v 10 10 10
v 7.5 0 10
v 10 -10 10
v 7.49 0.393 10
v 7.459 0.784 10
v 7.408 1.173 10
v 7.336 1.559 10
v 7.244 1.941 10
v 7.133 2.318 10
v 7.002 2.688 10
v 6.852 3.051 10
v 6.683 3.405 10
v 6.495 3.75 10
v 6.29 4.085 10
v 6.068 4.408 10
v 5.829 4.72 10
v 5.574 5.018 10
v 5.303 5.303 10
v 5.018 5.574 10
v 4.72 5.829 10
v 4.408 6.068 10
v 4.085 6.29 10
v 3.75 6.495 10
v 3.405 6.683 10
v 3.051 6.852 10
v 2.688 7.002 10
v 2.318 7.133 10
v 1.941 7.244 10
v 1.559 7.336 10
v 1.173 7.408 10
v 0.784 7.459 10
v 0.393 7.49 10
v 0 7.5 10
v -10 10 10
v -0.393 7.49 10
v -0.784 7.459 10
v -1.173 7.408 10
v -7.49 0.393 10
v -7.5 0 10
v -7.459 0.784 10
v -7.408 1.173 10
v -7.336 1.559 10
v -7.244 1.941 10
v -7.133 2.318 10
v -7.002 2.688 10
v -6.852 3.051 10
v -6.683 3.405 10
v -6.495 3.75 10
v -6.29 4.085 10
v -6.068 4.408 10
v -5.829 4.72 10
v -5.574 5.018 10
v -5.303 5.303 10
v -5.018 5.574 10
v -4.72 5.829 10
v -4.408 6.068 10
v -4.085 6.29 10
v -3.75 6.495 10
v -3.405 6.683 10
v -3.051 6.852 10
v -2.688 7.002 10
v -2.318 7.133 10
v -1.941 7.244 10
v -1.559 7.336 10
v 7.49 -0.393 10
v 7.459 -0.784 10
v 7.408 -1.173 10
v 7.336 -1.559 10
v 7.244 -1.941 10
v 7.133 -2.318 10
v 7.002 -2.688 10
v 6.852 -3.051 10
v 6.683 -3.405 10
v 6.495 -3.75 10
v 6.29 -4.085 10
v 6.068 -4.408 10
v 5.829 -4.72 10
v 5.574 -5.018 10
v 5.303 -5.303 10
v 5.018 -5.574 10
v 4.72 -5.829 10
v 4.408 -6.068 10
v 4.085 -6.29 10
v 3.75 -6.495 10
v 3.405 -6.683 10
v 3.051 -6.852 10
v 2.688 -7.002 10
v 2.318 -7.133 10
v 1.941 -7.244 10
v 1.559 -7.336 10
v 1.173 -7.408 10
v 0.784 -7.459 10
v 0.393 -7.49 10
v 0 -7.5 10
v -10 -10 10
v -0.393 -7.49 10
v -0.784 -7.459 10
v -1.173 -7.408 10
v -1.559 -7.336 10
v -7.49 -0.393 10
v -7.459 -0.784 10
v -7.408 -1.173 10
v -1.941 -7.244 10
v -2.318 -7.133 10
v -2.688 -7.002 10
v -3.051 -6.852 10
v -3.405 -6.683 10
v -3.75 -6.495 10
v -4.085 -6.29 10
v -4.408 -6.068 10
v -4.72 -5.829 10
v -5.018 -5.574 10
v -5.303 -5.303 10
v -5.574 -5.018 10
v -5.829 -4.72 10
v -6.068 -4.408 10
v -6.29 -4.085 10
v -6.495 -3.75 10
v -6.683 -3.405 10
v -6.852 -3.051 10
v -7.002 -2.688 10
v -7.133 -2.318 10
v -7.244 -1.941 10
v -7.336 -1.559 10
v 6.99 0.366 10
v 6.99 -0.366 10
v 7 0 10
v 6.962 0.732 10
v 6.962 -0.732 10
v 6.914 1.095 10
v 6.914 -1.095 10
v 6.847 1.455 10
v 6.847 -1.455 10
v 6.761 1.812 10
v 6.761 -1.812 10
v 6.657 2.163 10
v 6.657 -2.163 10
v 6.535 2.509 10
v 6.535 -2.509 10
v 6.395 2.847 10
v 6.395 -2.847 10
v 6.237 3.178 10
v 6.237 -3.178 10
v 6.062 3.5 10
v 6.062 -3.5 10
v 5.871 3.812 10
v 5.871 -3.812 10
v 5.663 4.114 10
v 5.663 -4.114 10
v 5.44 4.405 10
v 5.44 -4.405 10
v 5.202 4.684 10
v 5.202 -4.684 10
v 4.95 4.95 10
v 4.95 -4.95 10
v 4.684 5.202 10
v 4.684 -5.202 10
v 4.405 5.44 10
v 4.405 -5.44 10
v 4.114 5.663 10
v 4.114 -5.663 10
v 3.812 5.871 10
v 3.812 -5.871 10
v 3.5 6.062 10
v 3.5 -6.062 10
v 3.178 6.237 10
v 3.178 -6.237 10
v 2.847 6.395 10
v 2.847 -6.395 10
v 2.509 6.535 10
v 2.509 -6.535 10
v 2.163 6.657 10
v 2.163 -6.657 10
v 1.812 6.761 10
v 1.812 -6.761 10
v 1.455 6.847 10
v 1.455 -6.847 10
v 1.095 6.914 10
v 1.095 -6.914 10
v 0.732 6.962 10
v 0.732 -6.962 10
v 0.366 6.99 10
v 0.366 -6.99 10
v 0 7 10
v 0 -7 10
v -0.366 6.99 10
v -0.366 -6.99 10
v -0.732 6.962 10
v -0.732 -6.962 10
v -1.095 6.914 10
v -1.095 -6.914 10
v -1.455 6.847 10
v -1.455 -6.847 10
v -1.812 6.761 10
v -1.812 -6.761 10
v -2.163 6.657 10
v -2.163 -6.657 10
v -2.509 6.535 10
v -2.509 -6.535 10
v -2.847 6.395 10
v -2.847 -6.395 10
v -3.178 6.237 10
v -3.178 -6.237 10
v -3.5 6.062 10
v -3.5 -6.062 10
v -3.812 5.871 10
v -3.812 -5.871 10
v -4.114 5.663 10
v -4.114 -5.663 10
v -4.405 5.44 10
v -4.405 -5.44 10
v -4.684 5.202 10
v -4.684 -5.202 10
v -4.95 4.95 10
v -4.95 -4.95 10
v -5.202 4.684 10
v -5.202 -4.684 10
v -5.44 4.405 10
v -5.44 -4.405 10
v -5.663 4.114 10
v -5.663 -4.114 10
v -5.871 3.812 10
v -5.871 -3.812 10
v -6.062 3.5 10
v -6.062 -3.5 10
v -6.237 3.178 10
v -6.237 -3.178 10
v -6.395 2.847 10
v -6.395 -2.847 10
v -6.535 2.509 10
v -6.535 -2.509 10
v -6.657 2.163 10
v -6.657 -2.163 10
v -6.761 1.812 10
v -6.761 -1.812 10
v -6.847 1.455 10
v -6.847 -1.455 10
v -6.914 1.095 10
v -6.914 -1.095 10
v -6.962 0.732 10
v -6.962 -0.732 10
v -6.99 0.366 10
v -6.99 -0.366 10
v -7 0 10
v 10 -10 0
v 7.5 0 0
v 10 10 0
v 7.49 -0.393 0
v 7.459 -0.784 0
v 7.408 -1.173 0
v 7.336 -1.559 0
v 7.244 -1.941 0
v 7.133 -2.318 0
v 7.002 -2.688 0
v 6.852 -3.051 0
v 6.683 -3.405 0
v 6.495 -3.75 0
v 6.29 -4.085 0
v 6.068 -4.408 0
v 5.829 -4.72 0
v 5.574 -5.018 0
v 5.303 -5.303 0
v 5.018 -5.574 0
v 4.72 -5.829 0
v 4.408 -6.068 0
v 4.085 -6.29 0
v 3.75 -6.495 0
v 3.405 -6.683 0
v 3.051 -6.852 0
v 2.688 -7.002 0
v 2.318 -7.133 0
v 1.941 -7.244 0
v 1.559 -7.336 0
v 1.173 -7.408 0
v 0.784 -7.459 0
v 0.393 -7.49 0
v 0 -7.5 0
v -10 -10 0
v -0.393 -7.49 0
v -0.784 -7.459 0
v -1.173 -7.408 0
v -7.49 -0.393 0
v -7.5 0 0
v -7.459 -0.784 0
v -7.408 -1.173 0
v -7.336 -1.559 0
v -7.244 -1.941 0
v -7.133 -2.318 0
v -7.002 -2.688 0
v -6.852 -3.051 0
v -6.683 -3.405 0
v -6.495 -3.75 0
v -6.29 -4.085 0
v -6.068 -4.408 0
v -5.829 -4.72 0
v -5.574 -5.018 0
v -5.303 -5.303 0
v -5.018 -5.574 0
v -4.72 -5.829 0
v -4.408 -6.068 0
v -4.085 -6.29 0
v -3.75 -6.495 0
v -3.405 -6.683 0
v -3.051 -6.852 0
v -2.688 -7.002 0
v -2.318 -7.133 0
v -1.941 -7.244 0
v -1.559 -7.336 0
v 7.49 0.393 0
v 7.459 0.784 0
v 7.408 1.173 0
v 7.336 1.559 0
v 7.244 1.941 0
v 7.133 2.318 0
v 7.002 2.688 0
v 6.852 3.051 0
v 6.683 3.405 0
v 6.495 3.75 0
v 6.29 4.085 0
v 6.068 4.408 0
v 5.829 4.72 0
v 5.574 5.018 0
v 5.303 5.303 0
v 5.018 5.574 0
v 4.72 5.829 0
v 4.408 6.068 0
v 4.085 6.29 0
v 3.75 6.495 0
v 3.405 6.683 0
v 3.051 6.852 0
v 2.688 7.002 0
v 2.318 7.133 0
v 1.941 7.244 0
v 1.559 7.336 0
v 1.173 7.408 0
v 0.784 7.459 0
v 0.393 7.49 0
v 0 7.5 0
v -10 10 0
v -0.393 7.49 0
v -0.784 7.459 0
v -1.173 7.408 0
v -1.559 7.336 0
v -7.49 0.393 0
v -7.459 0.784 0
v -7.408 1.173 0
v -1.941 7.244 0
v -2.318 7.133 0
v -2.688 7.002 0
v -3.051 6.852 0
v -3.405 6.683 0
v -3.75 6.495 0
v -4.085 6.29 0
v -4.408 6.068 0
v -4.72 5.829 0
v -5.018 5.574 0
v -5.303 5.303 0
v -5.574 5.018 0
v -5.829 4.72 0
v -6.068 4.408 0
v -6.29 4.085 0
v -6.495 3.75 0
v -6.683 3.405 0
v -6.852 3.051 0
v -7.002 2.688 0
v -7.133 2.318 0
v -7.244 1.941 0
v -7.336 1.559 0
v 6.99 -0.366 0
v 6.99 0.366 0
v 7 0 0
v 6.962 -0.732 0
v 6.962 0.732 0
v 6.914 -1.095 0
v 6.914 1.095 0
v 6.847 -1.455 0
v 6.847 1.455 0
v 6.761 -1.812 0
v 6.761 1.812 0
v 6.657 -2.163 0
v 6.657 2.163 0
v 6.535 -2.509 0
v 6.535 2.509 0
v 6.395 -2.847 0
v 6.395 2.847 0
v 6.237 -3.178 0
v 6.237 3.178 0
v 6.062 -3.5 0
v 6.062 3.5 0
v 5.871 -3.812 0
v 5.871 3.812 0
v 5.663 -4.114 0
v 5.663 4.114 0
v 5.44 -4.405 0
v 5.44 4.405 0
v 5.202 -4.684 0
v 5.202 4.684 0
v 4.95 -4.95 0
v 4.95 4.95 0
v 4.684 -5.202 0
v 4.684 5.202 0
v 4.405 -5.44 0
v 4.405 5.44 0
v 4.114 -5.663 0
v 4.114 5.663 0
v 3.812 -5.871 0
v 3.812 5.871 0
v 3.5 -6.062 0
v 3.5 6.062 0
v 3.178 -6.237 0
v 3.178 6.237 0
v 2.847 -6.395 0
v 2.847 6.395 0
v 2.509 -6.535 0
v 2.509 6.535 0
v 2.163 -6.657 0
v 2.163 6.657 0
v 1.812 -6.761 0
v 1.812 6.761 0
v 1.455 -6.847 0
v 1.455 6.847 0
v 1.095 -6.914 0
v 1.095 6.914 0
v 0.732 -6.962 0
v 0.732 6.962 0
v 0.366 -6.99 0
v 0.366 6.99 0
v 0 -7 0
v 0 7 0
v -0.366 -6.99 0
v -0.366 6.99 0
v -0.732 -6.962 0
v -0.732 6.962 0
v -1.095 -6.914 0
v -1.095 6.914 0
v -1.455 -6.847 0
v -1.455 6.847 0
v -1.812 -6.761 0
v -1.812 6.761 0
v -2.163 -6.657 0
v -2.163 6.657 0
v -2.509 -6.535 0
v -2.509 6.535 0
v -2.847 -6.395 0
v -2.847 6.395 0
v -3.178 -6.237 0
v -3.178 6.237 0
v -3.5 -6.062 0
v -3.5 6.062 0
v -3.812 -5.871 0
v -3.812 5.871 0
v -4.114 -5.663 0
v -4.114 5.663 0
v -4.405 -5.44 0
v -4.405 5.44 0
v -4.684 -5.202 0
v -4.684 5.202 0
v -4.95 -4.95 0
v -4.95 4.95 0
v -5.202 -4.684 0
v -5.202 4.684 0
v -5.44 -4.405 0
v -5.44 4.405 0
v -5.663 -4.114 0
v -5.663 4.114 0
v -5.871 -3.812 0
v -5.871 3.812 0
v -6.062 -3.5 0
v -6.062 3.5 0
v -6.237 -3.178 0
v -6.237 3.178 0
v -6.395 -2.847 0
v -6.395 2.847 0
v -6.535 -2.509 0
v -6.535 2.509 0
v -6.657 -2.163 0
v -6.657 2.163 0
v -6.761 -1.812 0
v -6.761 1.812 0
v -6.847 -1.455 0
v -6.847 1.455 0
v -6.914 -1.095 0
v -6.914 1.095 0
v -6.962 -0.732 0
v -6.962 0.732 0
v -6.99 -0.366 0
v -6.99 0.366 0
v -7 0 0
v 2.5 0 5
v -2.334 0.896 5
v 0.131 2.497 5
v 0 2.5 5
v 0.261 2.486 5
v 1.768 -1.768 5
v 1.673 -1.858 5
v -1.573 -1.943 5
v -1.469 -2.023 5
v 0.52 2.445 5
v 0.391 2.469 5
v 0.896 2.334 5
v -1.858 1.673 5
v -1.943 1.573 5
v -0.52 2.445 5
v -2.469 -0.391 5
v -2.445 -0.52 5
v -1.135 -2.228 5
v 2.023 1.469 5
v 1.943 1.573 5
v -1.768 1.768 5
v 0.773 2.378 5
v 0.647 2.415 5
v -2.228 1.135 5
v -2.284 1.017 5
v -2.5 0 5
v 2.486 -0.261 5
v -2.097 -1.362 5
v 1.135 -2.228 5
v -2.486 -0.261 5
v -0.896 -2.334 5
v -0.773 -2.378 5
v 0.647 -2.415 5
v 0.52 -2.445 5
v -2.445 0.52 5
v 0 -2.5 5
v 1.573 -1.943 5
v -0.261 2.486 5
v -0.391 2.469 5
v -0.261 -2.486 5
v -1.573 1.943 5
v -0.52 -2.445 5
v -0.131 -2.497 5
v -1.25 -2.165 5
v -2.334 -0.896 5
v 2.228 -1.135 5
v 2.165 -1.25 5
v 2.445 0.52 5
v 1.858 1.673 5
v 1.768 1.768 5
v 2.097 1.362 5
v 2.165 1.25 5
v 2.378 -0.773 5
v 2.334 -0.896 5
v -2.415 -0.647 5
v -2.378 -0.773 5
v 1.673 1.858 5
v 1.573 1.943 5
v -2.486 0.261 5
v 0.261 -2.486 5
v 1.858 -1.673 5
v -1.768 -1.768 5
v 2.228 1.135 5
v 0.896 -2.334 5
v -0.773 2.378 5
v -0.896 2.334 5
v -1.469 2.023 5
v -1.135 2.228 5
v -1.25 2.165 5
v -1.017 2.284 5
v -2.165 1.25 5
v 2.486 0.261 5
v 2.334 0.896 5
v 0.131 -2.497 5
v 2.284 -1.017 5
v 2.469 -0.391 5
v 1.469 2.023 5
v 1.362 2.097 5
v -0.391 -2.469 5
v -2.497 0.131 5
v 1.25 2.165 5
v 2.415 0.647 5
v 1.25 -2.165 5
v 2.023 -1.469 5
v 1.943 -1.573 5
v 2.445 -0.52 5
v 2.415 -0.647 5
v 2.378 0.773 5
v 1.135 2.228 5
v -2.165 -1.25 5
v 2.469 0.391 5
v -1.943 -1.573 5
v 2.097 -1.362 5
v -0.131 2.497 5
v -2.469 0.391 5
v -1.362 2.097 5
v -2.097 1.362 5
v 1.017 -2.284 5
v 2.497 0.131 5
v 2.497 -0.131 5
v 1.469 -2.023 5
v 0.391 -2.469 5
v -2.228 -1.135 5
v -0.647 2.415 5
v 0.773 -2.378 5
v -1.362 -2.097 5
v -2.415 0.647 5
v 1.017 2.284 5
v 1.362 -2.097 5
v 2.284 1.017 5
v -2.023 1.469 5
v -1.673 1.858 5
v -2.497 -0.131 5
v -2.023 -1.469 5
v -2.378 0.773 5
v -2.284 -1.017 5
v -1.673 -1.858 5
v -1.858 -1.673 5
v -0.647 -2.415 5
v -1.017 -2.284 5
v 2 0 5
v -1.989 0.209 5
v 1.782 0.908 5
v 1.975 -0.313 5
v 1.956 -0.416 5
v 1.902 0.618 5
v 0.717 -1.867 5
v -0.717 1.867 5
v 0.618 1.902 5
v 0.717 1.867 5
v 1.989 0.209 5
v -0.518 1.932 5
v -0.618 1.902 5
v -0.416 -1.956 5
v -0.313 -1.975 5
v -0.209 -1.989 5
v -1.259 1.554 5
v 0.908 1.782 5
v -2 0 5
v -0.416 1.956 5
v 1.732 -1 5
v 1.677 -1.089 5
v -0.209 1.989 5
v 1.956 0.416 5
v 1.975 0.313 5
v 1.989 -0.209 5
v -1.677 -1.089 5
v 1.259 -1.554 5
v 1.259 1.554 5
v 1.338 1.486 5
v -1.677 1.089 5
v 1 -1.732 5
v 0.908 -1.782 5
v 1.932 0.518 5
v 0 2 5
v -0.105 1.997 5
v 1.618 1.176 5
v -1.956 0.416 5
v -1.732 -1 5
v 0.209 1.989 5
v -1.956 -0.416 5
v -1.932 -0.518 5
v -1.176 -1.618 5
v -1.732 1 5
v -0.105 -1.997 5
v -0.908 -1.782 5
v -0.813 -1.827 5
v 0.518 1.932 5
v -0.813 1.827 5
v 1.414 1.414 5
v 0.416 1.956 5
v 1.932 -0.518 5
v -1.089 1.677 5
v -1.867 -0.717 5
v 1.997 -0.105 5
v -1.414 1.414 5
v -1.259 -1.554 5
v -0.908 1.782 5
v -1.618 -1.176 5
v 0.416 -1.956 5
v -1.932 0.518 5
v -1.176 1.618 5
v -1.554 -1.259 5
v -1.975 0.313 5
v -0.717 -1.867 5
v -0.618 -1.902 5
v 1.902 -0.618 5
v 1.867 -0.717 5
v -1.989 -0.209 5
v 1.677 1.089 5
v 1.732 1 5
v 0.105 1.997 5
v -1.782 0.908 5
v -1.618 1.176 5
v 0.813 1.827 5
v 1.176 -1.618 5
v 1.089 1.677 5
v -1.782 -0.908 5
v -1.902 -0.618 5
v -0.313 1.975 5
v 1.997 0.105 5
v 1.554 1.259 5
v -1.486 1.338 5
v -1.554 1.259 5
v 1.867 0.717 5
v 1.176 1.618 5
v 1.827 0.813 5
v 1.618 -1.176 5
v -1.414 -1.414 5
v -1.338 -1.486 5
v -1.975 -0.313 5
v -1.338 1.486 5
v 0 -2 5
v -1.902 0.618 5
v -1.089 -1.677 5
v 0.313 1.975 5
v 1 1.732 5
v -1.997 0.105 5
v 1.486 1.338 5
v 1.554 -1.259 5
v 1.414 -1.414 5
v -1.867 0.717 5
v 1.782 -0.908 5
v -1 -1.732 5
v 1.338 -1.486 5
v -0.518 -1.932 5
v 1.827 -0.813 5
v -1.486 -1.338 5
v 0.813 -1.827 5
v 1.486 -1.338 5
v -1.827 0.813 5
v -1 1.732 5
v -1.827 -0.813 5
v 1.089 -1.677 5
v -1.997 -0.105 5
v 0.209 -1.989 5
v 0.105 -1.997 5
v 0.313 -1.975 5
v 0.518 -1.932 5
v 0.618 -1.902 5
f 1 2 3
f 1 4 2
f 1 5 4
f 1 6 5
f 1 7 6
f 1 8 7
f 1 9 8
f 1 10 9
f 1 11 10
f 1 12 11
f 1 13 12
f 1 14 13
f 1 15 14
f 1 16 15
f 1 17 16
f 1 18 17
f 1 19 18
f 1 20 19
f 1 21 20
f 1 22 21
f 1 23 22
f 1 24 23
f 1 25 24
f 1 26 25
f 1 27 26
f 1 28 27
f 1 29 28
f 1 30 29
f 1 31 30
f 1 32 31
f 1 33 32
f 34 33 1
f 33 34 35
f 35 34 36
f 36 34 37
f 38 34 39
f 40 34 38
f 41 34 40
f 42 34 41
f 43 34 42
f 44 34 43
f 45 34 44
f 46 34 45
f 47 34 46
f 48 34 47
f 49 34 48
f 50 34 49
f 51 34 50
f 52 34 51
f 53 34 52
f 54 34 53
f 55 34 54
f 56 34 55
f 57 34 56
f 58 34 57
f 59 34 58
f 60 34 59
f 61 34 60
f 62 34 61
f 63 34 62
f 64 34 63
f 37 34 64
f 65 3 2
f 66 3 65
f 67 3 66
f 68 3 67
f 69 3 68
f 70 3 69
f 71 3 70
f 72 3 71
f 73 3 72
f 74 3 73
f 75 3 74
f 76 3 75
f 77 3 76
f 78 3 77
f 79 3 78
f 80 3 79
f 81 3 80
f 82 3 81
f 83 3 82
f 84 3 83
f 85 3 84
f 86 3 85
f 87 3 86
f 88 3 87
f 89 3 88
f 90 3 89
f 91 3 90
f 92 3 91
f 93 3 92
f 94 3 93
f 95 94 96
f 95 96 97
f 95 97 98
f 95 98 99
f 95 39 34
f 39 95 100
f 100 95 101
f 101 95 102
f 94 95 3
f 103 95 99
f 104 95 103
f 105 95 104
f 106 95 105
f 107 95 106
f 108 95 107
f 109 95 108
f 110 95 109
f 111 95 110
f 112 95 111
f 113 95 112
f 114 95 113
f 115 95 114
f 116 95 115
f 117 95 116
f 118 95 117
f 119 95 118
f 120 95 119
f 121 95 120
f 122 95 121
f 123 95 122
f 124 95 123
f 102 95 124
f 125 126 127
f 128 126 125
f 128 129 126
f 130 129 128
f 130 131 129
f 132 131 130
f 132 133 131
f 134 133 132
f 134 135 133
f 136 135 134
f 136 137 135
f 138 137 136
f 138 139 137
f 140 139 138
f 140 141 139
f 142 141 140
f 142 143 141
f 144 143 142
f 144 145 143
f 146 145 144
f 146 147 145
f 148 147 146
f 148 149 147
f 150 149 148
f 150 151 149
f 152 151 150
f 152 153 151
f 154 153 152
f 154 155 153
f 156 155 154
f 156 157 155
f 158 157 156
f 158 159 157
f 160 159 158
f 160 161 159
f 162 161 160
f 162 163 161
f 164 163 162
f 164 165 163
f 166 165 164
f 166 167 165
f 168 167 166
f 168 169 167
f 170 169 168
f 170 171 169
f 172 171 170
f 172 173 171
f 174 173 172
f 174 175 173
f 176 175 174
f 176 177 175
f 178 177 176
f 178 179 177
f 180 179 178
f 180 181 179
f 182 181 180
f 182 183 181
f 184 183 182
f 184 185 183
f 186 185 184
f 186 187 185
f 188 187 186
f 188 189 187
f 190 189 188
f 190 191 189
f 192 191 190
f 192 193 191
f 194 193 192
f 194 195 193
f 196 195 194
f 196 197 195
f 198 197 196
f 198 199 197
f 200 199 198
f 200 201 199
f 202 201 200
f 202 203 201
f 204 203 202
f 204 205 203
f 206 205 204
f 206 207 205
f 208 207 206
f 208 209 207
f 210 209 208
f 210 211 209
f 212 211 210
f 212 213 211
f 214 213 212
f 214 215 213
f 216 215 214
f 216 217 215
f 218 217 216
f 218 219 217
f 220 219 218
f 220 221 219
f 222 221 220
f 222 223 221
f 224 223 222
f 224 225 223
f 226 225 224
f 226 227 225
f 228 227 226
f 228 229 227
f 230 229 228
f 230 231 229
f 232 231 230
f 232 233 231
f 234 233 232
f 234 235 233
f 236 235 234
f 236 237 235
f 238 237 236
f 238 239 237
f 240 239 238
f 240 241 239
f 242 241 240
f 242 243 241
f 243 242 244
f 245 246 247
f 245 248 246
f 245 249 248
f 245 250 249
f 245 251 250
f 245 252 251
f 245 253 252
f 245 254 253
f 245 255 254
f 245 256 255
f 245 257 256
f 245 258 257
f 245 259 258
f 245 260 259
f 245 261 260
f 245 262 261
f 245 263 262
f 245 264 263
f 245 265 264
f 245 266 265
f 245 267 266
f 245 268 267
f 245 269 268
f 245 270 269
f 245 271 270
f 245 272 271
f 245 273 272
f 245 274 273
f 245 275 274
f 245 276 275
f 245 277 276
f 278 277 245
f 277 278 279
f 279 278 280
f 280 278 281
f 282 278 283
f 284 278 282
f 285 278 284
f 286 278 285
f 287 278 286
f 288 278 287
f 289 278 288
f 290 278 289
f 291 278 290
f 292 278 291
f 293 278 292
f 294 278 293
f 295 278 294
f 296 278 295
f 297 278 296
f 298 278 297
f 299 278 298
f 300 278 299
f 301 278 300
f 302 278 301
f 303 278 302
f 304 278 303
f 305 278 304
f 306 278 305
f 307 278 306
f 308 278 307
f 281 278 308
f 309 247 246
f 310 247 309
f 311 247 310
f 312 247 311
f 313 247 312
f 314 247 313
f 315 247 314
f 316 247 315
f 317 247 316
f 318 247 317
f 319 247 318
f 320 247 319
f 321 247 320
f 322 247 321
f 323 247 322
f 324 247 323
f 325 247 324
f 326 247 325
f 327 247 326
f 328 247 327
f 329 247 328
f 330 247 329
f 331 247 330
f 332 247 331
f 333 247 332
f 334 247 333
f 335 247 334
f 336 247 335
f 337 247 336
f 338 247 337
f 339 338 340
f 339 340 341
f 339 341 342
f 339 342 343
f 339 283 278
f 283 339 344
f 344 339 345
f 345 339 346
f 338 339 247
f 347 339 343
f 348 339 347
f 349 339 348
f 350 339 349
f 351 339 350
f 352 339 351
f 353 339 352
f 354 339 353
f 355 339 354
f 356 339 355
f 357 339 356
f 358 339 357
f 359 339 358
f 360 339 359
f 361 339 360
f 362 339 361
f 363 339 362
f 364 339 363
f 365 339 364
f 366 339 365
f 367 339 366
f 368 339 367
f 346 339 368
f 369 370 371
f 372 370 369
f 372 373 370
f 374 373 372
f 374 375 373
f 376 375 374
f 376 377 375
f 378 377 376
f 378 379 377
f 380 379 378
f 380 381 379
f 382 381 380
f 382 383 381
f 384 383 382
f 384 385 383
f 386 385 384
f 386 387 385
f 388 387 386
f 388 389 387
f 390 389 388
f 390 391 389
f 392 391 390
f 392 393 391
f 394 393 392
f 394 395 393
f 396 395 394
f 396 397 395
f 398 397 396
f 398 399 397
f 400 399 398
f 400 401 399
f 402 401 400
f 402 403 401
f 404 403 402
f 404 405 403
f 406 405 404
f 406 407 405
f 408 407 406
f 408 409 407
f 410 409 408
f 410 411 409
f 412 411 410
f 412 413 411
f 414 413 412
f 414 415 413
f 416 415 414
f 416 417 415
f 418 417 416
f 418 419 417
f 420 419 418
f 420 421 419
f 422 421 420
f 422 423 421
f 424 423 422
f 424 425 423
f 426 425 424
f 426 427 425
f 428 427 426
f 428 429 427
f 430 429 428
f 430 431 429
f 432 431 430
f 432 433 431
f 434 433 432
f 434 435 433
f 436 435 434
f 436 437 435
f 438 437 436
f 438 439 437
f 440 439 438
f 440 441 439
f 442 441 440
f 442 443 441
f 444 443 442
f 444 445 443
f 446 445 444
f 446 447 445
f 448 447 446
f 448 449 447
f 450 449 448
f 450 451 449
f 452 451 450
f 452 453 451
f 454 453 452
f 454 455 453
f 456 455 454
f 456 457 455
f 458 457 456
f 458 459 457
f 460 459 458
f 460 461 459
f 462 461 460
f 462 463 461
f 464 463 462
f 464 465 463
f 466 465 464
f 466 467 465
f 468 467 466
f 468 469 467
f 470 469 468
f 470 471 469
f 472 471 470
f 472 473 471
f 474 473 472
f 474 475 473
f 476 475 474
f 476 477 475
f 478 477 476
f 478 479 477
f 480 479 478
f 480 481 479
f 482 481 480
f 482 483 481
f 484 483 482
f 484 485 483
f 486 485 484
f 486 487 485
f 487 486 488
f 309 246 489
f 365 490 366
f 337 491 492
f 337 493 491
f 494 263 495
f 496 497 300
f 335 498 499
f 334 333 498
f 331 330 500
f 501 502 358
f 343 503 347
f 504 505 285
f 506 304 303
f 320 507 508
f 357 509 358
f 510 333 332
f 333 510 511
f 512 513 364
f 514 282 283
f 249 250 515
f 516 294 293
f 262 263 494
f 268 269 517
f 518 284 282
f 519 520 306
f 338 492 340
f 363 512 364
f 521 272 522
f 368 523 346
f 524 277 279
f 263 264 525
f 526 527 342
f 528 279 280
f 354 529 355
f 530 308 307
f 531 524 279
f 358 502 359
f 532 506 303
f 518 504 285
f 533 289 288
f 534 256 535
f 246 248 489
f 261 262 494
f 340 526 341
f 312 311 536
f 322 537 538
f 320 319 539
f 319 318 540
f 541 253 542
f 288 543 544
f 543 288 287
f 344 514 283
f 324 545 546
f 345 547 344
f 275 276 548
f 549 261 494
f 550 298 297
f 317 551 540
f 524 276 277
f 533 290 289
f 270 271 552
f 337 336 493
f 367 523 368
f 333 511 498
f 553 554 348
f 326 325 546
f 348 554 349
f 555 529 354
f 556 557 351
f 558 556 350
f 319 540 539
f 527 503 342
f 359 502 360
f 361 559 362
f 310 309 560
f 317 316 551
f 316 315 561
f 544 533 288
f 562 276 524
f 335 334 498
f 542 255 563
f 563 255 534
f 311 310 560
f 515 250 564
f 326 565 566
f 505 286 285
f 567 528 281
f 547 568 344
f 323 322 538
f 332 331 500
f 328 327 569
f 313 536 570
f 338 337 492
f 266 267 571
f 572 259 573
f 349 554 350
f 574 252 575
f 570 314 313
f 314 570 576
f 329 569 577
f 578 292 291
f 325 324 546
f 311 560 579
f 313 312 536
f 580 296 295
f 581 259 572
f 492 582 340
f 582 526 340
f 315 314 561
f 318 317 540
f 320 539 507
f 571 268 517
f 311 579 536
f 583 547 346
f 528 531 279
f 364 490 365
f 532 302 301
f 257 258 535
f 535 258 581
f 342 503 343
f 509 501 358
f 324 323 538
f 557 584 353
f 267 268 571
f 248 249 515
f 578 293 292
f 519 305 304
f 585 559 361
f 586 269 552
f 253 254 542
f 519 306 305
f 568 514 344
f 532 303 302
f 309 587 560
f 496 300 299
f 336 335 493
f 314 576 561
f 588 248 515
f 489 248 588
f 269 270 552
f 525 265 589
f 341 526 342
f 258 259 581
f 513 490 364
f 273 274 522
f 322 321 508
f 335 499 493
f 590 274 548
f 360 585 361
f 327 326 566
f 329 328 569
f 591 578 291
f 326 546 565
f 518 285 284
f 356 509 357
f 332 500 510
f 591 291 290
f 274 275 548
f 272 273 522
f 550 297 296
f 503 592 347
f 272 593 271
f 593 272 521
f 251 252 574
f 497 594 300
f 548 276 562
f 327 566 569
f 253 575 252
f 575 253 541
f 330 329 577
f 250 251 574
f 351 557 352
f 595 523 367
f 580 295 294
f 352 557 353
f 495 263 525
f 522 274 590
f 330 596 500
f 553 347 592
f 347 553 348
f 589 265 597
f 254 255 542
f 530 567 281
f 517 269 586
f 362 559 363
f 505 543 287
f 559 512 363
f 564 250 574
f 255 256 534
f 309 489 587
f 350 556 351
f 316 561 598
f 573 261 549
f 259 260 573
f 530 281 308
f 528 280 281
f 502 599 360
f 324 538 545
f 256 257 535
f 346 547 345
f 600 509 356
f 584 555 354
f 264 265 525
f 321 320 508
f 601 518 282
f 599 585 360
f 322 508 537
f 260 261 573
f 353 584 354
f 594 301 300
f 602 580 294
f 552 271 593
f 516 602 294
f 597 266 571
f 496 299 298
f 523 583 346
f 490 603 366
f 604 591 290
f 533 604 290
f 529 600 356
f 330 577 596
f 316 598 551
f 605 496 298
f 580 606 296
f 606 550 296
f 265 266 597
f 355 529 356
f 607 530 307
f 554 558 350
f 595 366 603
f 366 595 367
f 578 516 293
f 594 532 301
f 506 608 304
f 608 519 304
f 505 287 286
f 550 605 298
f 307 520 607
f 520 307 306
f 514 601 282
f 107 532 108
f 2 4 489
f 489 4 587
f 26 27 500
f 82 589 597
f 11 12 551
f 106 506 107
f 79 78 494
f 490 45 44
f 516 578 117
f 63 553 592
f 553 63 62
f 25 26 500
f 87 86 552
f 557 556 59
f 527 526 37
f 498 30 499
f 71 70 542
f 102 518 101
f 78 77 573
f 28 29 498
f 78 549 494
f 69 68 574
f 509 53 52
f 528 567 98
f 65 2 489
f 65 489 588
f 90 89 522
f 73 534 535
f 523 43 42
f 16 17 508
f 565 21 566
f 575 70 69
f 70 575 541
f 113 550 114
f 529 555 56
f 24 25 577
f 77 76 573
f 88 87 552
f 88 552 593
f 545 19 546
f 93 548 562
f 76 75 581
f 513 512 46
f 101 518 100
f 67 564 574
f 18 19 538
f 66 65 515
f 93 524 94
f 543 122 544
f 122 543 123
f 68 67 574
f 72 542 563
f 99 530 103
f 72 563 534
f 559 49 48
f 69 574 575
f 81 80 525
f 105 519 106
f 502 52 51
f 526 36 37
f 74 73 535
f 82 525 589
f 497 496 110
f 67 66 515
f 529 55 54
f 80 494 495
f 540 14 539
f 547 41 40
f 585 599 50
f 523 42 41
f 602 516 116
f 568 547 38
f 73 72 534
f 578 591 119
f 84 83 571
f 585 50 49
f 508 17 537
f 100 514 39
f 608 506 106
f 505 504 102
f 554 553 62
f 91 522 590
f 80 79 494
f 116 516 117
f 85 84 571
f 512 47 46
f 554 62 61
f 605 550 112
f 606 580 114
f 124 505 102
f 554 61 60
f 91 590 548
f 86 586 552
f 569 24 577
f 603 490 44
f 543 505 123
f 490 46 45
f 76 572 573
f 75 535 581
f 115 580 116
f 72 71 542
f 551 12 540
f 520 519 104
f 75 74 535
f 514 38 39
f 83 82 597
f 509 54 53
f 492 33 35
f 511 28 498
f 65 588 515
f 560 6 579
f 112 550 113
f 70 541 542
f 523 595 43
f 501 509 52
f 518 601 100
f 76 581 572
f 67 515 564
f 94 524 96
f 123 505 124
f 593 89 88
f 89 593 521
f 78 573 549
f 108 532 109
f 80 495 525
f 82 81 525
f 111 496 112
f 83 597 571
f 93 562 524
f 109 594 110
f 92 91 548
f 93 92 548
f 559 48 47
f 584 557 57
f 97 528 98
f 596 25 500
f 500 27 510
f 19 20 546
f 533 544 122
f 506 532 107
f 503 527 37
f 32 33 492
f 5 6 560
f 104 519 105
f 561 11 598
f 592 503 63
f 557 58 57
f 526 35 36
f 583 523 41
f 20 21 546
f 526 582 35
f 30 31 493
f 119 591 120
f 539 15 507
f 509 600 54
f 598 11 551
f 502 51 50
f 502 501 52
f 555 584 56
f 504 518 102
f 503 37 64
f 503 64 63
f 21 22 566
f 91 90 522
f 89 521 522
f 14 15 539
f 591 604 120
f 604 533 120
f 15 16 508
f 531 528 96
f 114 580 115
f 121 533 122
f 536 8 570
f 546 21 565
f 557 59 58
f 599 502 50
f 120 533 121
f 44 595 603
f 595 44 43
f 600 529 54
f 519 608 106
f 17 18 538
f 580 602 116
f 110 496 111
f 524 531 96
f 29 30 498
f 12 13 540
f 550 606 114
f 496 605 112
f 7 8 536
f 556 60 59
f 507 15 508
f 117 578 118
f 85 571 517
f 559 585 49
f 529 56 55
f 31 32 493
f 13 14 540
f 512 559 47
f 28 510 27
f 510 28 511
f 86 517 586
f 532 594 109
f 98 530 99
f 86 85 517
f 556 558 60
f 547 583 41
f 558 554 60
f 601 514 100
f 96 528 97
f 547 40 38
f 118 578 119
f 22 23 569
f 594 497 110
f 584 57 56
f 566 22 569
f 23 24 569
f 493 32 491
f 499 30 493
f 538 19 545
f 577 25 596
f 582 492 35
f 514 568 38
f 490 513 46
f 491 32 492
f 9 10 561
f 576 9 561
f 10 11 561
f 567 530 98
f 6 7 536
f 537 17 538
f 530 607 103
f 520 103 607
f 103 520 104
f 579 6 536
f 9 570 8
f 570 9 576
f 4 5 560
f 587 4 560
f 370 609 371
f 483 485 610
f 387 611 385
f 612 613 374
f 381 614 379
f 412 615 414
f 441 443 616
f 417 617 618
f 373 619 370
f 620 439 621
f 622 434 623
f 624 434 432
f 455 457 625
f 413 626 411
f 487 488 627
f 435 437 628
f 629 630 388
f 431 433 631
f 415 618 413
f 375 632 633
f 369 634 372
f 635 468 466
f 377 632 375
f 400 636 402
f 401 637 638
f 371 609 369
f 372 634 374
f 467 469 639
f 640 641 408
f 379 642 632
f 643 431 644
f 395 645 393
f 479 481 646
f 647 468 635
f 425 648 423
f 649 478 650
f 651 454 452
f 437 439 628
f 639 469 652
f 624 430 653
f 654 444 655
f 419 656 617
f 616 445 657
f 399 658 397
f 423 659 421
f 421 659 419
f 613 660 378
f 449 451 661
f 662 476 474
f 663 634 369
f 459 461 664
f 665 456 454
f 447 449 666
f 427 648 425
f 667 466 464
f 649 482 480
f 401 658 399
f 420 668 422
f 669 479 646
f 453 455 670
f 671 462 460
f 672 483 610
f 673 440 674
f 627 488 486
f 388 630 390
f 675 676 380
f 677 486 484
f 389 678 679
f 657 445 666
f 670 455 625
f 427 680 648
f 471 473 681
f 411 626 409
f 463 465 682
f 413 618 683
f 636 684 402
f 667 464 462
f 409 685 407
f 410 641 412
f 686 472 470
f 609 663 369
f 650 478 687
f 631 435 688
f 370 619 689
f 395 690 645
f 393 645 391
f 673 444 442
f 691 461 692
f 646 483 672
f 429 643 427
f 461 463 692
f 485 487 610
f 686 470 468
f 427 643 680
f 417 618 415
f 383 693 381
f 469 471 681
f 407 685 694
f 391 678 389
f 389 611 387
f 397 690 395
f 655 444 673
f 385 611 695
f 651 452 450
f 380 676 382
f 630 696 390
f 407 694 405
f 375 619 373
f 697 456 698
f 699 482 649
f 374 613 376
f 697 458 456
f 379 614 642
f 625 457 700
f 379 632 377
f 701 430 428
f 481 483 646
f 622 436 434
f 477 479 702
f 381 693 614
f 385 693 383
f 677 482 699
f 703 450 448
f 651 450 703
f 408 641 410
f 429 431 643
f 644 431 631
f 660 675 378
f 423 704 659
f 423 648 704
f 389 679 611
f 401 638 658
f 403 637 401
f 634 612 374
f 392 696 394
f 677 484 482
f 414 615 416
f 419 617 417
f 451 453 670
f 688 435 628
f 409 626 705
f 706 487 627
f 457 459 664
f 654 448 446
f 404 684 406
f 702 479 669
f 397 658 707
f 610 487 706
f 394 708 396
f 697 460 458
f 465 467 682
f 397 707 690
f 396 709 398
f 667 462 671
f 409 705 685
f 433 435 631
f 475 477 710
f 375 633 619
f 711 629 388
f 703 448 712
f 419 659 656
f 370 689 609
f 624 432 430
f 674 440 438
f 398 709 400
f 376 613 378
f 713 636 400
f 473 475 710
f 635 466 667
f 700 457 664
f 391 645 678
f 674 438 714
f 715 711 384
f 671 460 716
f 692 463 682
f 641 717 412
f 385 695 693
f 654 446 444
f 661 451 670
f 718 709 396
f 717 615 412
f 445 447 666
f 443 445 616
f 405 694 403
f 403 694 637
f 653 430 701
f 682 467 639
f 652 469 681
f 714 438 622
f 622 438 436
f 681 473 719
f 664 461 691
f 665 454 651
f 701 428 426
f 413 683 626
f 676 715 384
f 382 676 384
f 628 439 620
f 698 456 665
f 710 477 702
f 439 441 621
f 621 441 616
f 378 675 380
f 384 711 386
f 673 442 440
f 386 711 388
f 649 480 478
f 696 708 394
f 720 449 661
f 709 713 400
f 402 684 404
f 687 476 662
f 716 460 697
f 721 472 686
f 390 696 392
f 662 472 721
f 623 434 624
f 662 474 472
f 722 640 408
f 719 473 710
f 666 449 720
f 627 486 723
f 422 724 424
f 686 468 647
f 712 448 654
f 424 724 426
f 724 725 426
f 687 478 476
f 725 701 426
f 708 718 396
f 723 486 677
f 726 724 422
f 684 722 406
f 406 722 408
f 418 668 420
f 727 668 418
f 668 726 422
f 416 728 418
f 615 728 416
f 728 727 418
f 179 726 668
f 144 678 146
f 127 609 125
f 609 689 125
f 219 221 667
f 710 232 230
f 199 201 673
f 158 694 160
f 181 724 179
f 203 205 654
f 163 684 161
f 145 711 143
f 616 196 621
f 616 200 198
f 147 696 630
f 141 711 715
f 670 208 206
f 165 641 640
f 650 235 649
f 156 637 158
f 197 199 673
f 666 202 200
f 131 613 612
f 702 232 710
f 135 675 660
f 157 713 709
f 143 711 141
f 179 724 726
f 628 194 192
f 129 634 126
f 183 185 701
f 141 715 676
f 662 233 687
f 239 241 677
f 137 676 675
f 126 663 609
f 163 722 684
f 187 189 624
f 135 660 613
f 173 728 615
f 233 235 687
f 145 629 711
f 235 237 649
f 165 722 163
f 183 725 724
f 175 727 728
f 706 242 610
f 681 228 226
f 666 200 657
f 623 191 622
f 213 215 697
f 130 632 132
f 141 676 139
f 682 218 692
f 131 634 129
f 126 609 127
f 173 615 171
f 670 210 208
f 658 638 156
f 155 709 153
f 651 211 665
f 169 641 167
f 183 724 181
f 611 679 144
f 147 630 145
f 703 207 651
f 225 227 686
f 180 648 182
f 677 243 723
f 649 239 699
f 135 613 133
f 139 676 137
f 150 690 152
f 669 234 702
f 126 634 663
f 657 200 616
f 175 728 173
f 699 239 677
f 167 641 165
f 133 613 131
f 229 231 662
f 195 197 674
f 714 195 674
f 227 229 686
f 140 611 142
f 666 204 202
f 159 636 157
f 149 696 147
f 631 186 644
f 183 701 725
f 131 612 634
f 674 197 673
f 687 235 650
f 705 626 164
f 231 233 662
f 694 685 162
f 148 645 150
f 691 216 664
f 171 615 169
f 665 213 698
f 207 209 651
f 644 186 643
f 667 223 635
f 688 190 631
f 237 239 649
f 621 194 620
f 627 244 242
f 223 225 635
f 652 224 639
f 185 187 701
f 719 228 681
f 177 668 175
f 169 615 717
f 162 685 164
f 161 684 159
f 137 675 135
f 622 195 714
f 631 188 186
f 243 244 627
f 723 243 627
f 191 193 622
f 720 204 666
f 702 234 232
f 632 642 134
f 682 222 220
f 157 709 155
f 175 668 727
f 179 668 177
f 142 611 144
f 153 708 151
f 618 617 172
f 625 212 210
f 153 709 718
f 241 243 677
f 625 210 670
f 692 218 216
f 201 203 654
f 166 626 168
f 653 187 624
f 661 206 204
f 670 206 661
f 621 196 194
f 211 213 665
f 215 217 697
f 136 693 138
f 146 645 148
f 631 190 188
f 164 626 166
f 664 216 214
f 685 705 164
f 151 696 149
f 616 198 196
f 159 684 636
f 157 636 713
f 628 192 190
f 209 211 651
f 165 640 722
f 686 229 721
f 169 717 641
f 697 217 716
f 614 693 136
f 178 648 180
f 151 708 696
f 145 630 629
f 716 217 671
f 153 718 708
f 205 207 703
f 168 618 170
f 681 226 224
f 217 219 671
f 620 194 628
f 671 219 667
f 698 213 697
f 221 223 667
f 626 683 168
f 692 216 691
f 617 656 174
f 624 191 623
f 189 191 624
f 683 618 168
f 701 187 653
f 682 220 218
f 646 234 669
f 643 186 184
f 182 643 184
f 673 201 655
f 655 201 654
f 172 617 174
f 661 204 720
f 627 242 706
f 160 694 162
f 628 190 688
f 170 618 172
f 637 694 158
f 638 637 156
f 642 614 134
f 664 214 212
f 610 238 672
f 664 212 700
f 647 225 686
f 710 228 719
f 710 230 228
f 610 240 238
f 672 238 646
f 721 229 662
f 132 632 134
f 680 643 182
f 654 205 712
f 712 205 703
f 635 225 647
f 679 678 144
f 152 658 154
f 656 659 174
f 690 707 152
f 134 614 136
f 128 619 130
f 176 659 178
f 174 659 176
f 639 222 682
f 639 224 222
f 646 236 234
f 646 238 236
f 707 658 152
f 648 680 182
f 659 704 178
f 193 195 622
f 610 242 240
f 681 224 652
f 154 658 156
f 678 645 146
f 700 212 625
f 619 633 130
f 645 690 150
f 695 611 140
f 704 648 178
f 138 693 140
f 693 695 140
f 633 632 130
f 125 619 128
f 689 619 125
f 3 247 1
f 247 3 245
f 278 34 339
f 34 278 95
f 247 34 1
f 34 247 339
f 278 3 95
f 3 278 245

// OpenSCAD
dia = 15;
gap = 1;
height = 10;
cone_height = 5;


module spool(height, dia, cone_height) {
    cylinder($fn = 120, h = height, d = (dia - 2*cone_height));
    cylinder($fn = 120, h = cone_height, d1 = dia, d2 = dia - 2*cone_height);
    translate([0, 0, height - cone_height]) {
        cylinder($fn = 120, h = cone_height, d1 = dia - 2*cone_height, d2 = dia);
    }
}

difference() {
    translate([-10, -10, 0]) {
        cube([20, 20, height]);
    }
    difference() {
        spool(height, dia, cone_height);
        spool(height, dia - gap, cone_height );
    }
}
